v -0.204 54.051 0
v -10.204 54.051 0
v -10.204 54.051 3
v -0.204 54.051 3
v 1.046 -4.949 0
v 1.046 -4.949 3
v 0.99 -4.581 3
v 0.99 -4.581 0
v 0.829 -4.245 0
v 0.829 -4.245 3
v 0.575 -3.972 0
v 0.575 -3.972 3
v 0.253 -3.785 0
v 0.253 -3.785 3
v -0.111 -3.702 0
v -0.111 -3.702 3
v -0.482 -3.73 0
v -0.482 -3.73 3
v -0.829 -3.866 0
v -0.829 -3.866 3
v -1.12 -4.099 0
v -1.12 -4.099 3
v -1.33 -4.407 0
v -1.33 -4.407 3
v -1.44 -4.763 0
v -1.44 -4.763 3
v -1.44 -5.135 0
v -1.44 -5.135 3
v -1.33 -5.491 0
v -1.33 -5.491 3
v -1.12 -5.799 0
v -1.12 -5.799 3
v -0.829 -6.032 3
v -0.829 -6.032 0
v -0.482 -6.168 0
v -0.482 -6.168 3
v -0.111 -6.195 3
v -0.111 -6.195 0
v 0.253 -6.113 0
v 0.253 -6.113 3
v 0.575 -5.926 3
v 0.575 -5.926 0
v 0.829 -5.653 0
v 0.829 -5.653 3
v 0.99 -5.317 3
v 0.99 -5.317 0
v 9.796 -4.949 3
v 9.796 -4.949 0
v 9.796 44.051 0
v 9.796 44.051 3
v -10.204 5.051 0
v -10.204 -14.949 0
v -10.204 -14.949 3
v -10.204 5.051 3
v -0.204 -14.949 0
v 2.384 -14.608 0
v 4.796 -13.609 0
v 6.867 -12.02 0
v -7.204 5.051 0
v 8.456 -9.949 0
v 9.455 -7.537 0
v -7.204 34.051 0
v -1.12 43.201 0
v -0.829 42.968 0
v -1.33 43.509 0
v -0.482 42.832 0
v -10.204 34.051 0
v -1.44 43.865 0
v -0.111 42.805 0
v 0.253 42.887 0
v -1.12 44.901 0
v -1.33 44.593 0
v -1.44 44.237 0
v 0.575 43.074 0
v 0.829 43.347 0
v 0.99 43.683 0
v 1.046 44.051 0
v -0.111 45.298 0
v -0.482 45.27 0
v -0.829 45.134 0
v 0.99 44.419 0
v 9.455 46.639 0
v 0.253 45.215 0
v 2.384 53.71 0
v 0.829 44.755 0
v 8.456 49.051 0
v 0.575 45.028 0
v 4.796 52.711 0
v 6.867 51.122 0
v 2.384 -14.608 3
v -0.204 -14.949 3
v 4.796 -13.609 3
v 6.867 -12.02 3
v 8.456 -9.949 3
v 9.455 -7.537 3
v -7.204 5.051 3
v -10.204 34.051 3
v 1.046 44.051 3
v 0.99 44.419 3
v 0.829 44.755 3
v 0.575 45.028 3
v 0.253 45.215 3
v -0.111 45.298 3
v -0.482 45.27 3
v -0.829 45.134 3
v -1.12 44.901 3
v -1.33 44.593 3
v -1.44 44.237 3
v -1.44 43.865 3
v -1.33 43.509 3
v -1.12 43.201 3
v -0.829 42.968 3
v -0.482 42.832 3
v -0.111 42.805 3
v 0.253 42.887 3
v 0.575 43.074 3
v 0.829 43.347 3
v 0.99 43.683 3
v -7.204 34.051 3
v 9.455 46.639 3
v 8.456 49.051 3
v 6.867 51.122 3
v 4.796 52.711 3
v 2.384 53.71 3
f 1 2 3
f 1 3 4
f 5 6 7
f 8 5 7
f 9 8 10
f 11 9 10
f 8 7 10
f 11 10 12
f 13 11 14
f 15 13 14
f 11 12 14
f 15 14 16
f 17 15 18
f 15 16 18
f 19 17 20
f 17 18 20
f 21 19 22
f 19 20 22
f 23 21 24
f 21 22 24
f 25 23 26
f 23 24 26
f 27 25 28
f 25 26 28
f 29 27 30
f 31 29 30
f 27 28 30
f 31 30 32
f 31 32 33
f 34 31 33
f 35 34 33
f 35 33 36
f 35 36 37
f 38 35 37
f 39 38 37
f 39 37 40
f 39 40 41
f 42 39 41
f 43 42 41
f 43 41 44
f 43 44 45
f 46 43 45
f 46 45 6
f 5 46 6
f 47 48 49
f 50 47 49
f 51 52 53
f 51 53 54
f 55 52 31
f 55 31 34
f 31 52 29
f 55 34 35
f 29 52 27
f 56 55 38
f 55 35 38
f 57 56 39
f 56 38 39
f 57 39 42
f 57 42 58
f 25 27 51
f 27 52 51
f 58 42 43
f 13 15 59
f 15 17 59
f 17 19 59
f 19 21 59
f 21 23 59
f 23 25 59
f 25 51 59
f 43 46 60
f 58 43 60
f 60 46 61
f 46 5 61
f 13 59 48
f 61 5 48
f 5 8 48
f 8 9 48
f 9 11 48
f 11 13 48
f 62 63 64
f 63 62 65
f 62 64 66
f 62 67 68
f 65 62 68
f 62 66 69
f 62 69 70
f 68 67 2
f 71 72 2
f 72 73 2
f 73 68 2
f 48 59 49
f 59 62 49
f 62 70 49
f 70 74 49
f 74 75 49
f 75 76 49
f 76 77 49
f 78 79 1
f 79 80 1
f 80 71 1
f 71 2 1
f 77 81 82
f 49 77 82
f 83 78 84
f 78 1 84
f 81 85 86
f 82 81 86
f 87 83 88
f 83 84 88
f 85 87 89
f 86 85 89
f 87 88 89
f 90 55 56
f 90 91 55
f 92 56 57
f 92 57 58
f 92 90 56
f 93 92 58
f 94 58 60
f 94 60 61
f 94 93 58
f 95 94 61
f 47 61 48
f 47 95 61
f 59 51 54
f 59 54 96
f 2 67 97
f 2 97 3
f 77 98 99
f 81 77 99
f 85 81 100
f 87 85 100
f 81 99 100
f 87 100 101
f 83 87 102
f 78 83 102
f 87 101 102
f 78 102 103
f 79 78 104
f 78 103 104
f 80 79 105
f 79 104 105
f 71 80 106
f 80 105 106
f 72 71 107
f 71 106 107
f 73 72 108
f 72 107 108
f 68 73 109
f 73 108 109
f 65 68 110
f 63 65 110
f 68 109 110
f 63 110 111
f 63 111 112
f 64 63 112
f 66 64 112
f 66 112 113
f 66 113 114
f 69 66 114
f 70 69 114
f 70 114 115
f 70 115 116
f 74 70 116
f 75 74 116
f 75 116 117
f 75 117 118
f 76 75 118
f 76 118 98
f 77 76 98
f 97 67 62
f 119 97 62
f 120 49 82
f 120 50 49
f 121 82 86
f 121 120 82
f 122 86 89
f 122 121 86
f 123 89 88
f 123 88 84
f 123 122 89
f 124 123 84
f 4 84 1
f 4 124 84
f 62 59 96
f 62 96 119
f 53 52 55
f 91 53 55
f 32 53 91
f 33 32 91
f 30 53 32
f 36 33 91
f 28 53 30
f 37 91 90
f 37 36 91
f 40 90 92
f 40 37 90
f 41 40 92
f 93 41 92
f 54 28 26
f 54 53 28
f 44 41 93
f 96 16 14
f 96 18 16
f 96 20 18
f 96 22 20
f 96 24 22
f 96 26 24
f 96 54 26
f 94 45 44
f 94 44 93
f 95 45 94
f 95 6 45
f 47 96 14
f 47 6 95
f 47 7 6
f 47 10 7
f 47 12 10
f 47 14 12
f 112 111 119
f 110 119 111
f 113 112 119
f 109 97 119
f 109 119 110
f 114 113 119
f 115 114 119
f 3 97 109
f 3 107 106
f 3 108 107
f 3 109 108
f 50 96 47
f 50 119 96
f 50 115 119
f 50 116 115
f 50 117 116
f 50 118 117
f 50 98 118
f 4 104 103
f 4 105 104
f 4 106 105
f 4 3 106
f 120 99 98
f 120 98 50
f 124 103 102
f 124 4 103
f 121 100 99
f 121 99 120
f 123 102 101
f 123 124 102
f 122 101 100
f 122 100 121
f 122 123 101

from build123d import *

# Parameters (mm, degrees)
SKETCH_1_W          = 20
SKETCH_1_H          = 69
EXTRUDE_1_DEPTH     = 3
SKETCH_2_W          = 3
SKETCH_2_H          = 29
CUT_EXTRUDE_1_DEPTH = 3
HOLE_WIZARD_M3_1_D  = 2.5
FILLET_1_R          = 10


with BuildPart() as part:
    # 草图1 → 凸台-拉伸1 (new body)
    with BuildSketch(Plane.XY):
        with Locations((-0.204081633, 19.551020408)):
            Rectangle(SKETCH_1_W, SKETCH_1_H)
    extrude(amount=EXTRUDE_1_DEPTH)

    # 草图2 → 切除-拉伸1 (cut)
    with BuildSketch(Plane.XY):
        with Locations((-8.704081633, 19.551020408)):
            Rectangle(SKETCH_2_W, SKETCH_2_H)
    extrude(amount=CUT_EXTRUDE_1_DEPTH, mode=Mode.SUBTRACT)

    # M3 螺纹孔的螺纹孔钻头1 (through all)
    with Locations(Plane(origin=(0, 0, 0), x_dir=(-1, 0, 0), z_dir=(0, 0, -1))):
        with Locations((0.204081633, 44.051020408), (0.204081633, -4.948979592)):
            Hole(HOLE_WIZARD_M3_1_D / 2)

    # 圆角1
    fillet_1_edges = [part.edges().sort_by_distance(p)[0] for p in [
        (9.795918367, 54.051020408, 1.5),
        (9.795918367, -14.948979592, 1.5),
    ]]
    fillet(fillet_1_edges, radius=FILLET_1_R)


solid = part.part
